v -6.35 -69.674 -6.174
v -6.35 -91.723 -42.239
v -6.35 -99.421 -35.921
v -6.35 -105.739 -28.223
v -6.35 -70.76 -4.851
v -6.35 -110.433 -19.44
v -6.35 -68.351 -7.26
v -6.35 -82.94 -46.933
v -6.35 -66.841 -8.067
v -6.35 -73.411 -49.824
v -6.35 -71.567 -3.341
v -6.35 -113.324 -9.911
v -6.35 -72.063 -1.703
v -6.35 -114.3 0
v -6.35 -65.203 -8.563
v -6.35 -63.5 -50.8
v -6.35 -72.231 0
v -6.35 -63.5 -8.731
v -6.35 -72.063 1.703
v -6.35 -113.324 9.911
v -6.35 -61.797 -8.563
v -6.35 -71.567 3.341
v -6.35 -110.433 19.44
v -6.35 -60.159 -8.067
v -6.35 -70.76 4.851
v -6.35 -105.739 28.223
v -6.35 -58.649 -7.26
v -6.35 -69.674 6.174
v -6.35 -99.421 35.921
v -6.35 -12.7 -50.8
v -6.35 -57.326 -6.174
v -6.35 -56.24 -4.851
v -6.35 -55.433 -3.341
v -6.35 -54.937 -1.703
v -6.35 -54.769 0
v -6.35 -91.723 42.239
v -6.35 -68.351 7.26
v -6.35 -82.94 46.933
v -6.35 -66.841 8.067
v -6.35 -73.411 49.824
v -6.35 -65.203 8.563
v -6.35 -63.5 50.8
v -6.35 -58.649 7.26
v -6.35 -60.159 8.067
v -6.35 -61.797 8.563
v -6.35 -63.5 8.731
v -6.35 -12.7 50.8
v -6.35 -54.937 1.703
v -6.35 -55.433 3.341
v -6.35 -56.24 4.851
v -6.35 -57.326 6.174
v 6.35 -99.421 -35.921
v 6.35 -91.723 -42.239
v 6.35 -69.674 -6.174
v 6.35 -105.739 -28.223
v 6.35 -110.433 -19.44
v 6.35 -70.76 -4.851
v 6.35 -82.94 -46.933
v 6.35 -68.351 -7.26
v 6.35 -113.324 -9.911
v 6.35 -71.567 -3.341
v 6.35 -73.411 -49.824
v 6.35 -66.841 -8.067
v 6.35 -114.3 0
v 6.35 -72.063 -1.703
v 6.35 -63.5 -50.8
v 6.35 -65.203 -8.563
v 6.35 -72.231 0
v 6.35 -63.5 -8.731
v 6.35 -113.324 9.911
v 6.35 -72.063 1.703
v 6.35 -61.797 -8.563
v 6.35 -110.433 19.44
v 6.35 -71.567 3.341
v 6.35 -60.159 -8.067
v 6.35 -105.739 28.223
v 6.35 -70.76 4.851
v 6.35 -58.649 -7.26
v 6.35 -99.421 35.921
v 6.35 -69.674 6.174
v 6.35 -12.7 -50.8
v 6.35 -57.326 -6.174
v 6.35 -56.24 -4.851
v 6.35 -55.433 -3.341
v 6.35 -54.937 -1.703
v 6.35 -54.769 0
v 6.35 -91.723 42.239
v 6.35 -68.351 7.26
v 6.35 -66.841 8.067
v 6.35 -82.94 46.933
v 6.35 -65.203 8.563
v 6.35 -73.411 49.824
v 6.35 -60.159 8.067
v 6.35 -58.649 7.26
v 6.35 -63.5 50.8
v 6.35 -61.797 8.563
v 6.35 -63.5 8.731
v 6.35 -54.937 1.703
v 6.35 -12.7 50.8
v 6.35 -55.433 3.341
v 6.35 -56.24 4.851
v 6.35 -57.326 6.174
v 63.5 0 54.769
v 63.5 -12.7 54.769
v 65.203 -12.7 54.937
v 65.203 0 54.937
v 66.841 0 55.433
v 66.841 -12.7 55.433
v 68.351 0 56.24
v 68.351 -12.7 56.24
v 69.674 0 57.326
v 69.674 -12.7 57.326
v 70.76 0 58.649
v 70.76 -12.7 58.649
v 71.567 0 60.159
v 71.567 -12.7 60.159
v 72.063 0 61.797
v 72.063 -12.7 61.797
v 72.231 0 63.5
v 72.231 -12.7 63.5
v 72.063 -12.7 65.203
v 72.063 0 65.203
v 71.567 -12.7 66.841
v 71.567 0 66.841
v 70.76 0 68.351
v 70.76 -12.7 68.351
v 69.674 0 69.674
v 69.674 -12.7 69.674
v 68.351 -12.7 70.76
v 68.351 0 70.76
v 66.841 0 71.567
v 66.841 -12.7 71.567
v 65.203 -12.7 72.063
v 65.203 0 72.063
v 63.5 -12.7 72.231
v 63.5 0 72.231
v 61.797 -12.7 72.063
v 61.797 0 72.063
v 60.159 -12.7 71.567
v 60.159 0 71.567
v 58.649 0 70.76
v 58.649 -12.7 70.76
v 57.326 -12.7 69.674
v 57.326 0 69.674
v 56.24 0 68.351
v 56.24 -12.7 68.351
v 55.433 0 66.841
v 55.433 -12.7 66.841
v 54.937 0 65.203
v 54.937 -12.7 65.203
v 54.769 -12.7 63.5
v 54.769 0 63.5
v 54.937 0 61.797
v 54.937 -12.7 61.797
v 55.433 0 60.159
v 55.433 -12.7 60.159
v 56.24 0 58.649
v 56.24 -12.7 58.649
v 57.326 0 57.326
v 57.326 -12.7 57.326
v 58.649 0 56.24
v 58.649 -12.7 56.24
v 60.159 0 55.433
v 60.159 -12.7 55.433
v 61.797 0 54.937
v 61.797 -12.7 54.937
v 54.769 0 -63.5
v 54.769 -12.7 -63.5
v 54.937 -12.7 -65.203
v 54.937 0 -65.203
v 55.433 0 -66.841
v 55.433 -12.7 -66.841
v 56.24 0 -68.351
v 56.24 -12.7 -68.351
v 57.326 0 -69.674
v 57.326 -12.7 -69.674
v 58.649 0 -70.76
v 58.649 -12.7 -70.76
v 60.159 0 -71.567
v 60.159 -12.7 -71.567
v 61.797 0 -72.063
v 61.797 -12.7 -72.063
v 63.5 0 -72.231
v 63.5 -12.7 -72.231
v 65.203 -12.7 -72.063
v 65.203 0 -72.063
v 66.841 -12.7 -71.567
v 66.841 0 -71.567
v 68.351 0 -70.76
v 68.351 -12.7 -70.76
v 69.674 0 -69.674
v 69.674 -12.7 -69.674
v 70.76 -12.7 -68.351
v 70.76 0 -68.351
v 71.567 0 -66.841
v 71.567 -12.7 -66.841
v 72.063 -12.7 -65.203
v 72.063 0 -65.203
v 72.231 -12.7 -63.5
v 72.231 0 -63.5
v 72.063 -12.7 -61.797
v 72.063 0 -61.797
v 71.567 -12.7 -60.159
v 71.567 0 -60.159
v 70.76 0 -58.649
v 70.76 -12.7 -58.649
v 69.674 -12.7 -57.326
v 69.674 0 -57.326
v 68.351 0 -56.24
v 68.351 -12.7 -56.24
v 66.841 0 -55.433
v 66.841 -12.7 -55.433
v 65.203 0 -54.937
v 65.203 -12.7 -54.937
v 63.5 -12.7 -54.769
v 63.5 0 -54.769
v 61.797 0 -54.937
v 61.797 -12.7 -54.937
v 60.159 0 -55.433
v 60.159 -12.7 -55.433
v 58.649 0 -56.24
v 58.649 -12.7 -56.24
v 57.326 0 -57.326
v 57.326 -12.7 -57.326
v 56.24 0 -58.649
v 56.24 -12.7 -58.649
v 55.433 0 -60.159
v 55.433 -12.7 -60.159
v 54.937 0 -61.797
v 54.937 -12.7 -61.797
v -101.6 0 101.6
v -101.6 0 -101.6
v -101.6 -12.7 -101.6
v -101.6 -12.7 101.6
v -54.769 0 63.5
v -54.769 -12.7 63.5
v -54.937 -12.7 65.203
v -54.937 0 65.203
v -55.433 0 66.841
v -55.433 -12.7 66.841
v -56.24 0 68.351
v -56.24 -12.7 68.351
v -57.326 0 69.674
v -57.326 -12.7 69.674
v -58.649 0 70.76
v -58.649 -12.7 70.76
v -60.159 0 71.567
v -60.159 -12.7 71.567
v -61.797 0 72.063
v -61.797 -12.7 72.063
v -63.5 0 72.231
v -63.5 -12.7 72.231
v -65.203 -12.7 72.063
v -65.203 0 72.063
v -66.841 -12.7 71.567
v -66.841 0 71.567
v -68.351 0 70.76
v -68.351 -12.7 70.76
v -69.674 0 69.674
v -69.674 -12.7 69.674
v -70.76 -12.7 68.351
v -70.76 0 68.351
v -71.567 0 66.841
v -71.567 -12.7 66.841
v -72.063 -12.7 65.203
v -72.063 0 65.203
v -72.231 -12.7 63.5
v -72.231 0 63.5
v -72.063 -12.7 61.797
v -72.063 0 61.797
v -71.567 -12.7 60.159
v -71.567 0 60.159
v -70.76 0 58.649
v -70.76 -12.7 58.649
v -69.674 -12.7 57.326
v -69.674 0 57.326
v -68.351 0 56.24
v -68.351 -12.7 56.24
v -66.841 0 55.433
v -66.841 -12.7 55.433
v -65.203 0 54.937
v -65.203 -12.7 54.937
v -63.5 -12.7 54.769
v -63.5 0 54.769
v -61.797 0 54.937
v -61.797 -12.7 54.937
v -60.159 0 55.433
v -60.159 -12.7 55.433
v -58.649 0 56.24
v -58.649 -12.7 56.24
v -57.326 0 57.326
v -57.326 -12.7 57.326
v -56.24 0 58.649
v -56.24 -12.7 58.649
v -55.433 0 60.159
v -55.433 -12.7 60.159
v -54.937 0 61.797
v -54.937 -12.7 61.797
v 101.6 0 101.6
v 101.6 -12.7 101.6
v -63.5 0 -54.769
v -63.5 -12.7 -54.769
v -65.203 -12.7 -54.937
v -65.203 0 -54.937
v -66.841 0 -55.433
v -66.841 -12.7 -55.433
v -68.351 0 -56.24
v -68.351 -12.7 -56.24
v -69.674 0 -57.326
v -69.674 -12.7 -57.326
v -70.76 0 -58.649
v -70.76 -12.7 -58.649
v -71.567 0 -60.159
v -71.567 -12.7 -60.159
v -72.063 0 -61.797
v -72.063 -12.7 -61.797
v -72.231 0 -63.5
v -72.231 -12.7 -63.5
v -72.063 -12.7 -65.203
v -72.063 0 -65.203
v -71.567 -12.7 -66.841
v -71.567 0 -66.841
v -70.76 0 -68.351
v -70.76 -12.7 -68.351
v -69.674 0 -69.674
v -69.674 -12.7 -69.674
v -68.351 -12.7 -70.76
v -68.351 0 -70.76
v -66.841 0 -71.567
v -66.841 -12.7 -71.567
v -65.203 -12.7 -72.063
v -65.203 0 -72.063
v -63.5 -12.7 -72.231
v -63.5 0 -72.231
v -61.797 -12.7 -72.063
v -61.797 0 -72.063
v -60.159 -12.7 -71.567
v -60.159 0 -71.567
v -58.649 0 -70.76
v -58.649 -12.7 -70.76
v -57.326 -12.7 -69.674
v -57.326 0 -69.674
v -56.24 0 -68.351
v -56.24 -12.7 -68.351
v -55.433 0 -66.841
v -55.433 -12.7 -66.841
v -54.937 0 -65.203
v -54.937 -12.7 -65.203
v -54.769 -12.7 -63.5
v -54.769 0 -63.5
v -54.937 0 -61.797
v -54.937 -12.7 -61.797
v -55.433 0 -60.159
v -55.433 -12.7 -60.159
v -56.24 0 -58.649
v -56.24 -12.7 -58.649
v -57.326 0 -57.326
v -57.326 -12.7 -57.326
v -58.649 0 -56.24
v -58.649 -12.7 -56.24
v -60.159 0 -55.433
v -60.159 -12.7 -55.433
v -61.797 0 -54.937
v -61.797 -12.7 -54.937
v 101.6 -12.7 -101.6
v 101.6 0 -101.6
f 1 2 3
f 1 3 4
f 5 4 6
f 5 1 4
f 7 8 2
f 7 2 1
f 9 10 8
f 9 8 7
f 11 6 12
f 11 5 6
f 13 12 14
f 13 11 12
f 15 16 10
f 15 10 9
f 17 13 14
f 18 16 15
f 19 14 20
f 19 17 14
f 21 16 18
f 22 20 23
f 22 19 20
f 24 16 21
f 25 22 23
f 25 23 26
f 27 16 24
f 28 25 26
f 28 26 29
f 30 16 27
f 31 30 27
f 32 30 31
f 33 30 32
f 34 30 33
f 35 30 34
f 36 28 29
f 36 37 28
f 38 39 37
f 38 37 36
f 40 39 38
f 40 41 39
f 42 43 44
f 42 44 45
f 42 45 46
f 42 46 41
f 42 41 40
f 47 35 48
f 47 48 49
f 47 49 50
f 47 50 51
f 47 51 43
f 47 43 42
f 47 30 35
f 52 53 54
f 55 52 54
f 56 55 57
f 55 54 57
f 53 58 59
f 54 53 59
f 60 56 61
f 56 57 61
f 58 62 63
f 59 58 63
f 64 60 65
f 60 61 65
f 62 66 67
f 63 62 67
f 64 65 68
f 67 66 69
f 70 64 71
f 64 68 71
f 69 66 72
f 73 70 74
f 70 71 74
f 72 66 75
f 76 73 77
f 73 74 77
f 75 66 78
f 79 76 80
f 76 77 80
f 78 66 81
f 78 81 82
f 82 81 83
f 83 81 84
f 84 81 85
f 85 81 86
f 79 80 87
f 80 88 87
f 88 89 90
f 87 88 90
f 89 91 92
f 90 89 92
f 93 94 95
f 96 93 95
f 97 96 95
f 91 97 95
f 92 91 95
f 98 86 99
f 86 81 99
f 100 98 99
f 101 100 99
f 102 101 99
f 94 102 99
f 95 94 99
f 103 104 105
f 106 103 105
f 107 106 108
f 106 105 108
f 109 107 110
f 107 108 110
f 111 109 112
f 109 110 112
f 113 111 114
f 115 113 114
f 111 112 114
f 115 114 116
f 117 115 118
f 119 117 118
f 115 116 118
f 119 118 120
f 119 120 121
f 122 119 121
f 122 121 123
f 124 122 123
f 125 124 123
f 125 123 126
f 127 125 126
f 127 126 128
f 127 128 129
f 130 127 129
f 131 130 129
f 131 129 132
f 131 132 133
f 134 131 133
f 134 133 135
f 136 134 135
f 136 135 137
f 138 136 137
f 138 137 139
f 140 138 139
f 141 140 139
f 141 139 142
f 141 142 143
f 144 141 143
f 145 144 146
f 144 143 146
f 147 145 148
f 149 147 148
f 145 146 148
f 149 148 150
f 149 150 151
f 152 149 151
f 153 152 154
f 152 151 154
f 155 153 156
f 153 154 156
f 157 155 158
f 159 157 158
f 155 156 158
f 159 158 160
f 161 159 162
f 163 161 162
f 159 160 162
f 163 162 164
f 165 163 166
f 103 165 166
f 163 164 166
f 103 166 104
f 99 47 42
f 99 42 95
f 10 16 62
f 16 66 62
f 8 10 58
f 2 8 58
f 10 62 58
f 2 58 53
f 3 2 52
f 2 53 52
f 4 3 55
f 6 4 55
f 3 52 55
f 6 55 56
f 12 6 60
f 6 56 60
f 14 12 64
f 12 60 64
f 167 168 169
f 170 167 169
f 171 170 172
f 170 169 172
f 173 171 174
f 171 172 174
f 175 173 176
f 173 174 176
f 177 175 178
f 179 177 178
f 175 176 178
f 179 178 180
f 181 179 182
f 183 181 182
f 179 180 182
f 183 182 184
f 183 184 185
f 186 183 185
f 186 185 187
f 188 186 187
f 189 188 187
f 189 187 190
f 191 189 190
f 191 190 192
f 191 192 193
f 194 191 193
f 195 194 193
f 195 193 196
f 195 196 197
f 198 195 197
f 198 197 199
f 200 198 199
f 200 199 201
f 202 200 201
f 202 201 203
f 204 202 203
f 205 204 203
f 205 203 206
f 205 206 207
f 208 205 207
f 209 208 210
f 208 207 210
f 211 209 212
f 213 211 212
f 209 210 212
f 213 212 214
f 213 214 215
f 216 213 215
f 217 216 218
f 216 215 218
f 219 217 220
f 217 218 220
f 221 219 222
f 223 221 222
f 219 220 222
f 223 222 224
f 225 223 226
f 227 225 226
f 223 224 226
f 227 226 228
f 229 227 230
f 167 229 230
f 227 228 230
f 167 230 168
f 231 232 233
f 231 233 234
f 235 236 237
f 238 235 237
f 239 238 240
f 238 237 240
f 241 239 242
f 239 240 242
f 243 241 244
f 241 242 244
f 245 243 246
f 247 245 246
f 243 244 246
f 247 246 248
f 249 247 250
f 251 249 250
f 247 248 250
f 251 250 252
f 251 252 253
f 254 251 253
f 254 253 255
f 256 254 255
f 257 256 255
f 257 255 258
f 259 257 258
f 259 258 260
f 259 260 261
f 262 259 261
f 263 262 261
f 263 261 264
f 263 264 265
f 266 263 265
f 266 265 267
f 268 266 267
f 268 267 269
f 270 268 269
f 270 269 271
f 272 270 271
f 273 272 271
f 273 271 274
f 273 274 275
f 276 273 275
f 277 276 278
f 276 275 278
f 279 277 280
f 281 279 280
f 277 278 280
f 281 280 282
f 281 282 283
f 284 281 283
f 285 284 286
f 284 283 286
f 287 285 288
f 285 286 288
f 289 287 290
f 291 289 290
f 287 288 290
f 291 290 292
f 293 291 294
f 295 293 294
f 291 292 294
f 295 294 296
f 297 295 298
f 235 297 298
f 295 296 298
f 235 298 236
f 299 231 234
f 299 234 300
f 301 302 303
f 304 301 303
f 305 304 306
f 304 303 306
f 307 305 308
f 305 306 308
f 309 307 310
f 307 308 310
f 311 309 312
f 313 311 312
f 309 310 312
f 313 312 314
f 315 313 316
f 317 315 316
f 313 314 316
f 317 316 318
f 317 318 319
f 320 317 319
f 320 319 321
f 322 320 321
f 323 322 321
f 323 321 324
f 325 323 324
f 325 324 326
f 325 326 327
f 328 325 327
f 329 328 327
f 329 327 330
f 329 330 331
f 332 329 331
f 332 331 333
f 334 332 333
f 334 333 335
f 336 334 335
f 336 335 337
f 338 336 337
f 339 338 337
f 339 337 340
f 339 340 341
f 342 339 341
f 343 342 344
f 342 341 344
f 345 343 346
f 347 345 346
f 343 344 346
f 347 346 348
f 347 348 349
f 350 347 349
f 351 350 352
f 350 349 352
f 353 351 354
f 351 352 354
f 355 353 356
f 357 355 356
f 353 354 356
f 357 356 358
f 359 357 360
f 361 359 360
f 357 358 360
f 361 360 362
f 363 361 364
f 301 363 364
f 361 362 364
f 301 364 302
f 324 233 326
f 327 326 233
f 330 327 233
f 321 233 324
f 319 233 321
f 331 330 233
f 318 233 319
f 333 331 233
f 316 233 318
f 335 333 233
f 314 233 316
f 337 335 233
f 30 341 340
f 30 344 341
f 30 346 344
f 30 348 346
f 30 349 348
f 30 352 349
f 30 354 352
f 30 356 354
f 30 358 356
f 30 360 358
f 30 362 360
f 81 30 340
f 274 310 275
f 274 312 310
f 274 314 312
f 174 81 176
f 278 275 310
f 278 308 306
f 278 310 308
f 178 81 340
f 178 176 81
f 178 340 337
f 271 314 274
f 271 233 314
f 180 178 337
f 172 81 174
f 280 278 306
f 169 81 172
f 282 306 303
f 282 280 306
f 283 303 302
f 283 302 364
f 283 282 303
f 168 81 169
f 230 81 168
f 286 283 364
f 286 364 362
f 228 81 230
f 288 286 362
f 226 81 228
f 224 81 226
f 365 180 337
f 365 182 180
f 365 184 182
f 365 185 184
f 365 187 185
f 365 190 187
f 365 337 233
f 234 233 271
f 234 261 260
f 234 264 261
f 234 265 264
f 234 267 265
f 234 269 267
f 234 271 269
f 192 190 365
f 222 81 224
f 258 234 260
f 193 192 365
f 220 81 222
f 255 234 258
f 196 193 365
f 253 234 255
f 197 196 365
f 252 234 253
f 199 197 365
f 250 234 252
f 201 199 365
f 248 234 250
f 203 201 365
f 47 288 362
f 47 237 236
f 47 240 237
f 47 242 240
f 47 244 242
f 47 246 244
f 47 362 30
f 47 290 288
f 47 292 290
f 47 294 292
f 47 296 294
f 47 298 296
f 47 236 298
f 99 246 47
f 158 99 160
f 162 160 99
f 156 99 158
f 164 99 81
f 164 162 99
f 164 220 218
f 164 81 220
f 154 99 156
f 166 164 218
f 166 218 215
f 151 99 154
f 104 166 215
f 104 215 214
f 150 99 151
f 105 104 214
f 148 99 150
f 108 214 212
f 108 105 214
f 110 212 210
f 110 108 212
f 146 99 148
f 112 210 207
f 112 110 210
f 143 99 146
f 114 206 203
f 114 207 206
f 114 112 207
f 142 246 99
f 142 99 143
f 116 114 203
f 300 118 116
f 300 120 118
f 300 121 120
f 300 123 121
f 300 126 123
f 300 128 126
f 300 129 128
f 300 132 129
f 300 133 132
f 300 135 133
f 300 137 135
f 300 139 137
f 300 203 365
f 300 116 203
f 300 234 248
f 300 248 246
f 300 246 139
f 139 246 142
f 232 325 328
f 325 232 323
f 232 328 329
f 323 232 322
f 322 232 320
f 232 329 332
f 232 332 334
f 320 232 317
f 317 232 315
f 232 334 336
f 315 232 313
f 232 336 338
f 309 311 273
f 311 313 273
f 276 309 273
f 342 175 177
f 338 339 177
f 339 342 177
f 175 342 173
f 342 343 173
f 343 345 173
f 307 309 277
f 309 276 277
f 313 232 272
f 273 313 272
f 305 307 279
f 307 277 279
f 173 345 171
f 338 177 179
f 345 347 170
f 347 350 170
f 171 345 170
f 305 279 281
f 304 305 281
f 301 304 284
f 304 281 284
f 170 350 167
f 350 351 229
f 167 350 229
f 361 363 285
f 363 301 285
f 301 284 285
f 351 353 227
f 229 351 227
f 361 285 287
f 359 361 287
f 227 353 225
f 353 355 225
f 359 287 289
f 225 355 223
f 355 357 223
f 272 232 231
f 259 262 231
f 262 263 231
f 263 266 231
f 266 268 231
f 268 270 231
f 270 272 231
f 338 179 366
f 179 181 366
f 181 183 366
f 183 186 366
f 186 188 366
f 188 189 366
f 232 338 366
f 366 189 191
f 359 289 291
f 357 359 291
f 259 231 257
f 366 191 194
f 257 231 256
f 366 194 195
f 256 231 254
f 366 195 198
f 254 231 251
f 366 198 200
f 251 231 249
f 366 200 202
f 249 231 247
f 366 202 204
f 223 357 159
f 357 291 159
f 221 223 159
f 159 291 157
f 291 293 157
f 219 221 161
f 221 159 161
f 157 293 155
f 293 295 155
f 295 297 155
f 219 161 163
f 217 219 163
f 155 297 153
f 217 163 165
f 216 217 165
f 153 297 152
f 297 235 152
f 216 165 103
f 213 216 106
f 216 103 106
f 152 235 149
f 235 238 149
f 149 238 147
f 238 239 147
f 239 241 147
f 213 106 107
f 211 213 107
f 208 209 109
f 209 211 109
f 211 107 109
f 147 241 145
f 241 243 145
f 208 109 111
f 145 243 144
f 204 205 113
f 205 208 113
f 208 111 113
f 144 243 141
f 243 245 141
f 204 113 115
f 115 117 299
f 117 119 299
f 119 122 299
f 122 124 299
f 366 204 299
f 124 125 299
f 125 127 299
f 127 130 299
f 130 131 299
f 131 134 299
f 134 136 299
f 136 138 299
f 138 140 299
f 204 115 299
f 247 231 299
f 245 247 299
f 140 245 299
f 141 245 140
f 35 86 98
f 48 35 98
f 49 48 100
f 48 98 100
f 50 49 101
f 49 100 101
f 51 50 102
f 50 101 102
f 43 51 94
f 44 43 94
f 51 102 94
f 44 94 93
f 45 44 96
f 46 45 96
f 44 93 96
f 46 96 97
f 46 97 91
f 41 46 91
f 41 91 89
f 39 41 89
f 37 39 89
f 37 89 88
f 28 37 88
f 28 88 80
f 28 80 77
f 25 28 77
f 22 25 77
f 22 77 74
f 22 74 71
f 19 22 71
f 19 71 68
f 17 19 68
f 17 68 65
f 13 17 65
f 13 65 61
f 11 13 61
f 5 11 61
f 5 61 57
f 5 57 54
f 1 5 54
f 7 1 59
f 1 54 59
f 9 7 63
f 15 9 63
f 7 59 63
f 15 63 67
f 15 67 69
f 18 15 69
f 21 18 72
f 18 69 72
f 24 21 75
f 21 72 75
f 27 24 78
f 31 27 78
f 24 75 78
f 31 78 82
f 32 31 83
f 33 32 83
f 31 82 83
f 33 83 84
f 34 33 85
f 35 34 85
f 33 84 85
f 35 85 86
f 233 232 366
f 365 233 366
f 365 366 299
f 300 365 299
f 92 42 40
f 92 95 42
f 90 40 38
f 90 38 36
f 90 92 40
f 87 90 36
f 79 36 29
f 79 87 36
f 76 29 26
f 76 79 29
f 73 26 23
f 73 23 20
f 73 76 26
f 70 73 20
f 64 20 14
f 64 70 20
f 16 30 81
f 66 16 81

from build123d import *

# Parameters (mm, degrees)
F0_W            = 203.2
F0_H            = 203.2
F1_DEPTH        = 12.7
F2_W            = 12.7
F2_H            = 101.6
F3_DEPTH        = 101.6
F4_R            = 50.79999
F5_R            = 8.73125
F6_DEPTH        = 25.4
F7_R            = 8.73125
F8_DEPTH        = 25.4
F8_COPIES_COUNT = 4


# Not quite as in the source:
# - a fillet or chamfer is up to 0.001 mm smaller than in the source, because OpenCascade refuses the exact size
# - a pattern or mirror of a feature is missing from the dataset's text; its kind, count and spacing are read off the source's solid


with BuildPart() as f1:
    # F0 (on Front) → F1 (new body)
    with BuildSketch(Plane.XZ):
        Rectangle(F0_W, F0_H)
    extrude(amount=F1_DEPTH)

    # F2 (on face) → F3 (join)
    with BuildSketch(Plane.XZ.offset(12.7)):
        Rectangle(F2_W, F2_H)
    extrude(amount=F3_DEPTH)

    # F4 (radius 50.8 in the source; OpenCascade refuses exactly that, so slightly less here)
    f4_edges = [f1.edges().sort_by_distance(p)[0] for p in [
        (0, -114.3, 50.8),
        (0, -114.3, -50.8),
    ]]
    fillet(f4_edges, radius=F4_R)

    # F5 (on face) → F6 (cut)
    with BuildSketch(Plane.YZ.offset(6.35)):
        with Locations((-63.5, 0)):
            Circle(F5_R)
    extrude(amount=-F6_DEPTH, mode=Mode.SUBTRACT)

    # F7 (on face) → F8 (cut)
    with BuildSketch(Plane.XZ.offset(12.7)):
        with Locations((-63.5, 63.5)):
            Circle(F7_R)
    f8 = extrude(amount=-F8_DEPTH, mode=Mode.SUBTRACT)

    # F8_copies: F8 ×4 about axis
    f8_copies_axis = Axis((0, 0, 0), (0, 1, 0))
    for i in range(1, F8_COPIES_COUNT):
        add(f8.rotate(f8_copies_axis, i * 360 / F8_COPIES_COUNT), mode=Mode.SUBTRACT)


solid = f1.part
